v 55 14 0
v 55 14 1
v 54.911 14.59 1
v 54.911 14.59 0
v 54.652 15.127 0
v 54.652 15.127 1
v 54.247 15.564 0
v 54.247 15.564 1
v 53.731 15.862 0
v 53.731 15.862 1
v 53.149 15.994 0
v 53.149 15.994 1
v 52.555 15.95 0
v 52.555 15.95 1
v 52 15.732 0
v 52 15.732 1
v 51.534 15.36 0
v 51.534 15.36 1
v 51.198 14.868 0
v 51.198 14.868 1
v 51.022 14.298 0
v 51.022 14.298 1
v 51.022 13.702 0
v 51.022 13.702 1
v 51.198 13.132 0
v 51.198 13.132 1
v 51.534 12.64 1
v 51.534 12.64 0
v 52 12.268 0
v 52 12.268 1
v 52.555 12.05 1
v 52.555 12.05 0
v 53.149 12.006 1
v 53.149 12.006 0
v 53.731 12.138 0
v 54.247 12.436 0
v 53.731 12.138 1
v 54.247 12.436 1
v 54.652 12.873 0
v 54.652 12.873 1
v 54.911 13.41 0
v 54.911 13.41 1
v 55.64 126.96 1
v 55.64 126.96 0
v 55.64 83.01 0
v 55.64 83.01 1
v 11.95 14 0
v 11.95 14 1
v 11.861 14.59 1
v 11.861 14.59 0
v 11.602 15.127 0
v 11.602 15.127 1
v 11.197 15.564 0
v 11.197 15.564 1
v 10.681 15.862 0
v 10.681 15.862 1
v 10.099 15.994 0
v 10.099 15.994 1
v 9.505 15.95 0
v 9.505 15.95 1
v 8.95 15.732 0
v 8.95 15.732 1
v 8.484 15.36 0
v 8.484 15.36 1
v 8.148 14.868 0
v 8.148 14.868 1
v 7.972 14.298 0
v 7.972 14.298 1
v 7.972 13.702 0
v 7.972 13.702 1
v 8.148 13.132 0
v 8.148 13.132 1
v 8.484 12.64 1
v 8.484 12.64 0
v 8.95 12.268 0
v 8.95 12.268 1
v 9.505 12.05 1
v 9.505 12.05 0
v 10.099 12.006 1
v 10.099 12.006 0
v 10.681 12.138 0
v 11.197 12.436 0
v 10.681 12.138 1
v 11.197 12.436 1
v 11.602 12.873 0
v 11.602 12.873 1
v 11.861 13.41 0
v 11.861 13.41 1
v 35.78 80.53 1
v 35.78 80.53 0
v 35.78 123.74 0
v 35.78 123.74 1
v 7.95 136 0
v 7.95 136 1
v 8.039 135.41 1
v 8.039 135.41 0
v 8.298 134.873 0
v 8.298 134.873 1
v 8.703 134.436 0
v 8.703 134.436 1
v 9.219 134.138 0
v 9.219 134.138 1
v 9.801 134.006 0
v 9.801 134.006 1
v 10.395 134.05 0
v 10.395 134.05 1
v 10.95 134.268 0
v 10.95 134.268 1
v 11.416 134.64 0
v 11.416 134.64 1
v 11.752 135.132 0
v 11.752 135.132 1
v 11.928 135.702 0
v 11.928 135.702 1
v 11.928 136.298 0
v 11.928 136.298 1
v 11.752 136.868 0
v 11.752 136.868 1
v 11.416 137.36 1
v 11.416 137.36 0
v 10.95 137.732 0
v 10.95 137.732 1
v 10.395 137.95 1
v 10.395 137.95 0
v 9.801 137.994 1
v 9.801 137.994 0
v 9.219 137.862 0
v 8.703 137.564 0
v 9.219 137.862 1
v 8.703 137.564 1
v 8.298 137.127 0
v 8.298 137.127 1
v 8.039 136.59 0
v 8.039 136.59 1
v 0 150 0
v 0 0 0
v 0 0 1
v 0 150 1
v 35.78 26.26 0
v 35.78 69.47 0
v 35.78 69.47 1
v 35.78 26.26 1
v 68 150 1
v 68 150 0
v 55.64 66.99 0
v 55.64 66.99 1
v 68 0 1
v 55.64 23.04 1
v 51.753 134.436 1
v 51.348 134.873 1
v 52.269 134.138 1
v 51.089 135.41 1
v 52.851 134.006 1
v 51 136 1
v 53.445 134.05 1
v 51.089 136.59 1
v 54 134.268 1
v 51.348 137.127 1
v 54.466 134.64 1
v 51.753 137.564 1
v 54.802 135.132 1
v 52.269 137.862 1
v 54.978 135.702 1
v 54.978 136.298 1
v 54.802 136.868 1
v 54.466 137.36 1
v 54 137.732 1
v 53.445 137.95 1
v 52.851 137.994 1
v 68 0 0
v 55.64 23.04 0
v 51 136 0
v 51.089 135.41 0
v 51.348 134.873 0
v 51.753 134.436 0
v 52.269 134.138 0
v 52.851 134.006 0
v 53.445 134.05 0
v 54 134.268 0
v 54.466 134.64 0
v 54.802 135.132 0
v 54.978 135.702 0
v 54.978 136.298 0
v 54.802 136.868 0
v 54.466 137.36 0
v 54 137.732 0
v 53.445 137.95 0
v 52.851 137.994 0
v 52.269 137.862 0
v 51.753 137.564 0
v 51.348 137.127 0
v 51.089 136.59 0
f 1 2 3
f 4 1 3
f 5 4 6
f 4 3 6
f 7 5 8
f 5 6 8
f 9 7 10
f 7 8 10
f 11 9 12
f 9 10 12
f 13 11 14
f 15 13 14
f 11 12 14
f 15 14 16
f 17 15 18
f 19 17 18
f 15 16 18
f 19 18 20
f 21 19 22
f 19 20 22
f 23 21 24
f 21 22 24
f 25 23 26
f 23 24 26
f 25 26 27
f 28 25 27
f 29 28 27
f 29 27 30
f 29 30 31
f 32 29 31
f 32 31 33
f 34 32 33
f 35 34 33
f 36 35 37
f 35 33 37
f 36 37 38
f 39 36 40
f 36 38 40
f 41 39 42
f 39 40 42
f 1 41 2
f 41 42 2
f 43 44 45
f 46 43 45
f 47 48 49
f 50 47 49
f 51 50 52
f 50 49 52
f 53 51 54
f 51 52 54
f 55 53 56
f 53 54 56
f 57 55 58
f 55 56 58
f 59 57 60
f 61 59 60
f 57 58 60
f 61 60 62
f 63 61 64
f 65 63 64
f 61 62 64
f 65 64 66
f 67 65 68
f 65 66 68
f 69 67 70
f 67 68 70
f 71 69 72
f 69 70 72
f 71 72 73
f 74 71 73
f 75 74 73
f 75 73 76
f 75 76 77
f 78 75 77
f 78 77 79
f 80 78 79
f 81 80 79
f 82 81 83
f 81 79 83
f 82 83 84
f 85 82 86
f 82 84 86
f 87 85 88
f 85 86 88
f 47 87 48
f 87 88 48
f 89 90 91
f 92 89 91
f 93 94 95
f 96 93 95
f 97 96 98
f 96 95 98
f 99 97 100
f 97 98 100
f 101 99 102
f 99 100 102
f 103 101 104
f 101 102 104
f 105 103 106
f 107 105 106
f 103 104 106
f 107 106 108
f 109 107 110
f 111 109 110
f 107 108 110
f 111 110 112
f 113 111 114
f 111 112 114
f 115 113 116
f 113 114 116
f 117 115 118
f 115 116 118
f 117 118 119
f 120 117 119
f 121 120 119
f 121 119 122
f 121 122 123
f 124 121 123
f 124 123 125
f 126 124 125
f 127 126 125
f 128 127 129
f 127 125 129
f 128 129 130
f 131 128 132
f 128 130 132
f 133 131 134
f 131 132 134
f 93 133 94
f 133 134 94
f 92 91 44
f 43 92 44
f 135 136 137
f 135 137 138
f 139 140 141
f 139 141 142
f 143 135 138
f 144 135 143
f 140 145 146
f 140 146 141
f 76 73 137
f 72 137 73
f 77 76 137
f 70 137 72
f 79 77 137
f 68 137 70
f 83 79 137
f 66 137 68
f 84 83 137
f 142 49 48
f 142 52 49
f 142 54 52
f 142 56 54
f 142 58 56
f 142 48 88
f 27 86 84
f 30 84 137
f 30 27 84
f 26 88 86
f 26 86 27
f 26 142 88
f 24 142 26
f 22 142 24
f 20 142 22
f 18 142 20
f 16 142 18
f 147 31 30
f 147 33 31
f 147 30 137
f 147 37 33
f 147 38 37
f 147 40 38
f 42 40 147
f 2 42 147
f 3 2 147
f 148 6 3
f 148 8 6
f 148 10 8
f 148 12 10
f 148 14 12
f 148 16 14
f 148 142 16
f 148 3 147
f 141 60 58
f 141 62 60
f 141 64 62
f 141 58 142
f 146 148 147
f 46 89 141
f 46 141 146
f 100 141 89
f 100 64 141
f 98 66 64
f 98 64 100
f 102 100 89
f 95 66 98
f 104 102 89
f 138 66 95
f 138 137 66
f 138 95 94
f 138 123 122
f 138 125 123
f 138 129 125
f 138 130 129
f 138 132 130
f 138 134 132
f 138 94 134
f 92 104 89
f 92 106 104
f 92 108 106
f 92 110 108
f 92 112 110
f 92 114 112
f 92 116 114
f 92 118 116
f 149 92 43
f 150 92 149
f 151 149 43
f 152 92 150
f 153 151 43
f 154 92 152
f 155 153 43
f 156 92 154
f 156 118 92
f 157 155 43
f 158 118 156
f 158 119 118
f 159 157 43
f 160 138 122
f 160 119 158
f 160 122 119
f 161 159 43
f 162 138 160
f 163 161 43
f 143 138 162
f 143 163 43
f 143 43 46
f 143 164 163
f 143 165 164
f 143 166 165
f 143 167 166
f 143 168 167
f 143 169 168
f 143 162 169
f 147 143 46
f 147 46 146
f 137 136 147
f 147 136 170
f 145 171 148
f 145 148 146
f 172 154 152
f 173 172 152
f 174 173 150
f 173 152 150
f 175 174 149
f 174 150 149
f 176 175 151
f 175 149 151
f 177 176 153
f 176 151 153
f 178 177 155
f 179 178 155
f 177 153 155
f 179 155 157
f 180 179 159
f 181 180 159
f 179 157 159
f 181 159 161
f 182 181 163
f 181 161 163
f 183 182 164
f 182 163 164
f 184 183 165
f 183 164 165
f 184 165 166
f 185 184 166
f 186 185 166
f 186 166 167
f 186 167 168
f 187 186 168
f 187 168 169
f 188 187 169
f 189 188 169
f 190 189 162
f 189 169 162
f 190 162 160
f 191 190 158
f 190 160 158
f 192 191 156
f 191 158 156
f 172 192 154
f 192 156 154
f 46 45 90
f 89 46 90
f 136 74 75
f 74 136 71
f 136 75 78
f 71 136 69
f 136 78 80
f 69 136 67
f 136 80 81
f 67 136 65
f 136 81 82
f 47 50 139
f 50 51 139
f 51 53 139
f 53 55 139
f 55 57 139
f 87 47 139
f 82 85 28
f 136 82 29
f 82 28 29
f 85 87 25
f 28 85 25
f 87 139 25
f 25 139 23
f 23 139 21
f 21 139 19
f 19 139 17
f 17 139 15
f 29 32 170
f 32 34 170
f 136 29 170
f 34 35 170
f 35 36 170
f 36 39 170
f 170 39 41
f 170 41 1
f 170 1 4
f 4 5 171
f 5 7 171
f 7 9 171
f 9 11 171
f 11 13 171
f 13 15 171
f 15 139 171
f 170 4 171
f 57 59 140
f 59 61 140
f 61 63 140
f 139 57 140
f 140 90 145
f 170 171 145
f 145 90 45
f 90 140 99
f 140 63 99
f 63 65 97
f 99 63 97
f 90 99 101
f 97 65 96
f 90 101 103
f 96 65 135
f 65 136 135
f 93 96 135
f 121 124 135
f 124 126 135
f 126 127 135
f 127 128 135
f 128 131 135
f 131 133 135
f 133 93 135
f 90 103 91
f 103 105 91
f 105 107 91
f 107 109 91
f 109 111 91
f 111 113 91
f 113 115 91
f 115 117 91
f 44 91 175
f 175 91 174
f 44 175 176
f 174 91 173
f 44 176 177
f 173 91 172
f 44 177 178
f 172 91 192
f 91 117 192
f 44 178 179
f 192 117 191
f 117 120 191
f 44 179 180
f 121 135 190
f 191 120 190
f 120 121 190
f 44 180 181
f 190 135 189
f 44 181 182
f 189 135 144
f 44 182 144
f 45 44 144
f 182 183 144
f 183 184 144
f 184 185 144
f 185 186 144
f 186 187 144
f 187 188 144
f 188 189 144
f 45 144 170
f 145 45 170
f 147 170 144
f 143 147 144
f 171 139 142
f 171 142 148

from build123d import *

# Parameters (mm, degrees)
SKETCH1_W           = 68
SKETCH1_H           = 150
BOSS_EXTRUDE1_DEPTH = 1
SKETCH2_R           = 2
CUT_EXTRUDE1_DEPTH  = 1
CUT_EXTRUDE2_DEPTH  = 20


with BuildPart() as part:
    # Sketch1 → Boss-Extrude1 (new body)
    with BuildSketch(Plane.XY):
        with Locations((34, 75)):
            Rectangle(SKETCH1_W, SKETCH1_H)
    extrude(amount=BOSS_EXTRUDE1_DEPTH)

    # Sketch2 → Cut-Extrude1 (cut)
    with BuildSketch(Plane.XY.offset(1)):
        with Locations((9.95, 14)):
            Circle(SKETCH2_R)
        with Locations((53, 14)):
            Circle(SKETCH2_R)
        with Locations(Location((53, 136, 0), (0, 0, 180))):
            Circle(SKETCH2_R)
        with Locations(Location((9.95, 136, 0), (0, 0, 180))):
            Circle(SKETCH2_R)
    extrude(amount=-CUT_EXTRUDE1_DEPTH, mode=Mode.SUBTRACT)

    # Sketch3 → Cut-Extrude2 (cut)
    with BuildSketch(Plane(origin=(0, 0, 0), x_dir=(-1, 0, 0), z_dir=(0, 0, -1))):
        Polygon((-35.78, 80.53), (-35.78, 123.74), (-55.64, 126.96), (-55.64, 83.01), align=None)
        Polygon((-55.64, 66.99), (-35.78, 69.47), (-35.78, 26.26), (-55.64, 23.04), align=None)
    extrude(amount=-CUT_EXTRUDE2_DEPTH, mode=Mode.SUBTRACT)


solid = part.part
